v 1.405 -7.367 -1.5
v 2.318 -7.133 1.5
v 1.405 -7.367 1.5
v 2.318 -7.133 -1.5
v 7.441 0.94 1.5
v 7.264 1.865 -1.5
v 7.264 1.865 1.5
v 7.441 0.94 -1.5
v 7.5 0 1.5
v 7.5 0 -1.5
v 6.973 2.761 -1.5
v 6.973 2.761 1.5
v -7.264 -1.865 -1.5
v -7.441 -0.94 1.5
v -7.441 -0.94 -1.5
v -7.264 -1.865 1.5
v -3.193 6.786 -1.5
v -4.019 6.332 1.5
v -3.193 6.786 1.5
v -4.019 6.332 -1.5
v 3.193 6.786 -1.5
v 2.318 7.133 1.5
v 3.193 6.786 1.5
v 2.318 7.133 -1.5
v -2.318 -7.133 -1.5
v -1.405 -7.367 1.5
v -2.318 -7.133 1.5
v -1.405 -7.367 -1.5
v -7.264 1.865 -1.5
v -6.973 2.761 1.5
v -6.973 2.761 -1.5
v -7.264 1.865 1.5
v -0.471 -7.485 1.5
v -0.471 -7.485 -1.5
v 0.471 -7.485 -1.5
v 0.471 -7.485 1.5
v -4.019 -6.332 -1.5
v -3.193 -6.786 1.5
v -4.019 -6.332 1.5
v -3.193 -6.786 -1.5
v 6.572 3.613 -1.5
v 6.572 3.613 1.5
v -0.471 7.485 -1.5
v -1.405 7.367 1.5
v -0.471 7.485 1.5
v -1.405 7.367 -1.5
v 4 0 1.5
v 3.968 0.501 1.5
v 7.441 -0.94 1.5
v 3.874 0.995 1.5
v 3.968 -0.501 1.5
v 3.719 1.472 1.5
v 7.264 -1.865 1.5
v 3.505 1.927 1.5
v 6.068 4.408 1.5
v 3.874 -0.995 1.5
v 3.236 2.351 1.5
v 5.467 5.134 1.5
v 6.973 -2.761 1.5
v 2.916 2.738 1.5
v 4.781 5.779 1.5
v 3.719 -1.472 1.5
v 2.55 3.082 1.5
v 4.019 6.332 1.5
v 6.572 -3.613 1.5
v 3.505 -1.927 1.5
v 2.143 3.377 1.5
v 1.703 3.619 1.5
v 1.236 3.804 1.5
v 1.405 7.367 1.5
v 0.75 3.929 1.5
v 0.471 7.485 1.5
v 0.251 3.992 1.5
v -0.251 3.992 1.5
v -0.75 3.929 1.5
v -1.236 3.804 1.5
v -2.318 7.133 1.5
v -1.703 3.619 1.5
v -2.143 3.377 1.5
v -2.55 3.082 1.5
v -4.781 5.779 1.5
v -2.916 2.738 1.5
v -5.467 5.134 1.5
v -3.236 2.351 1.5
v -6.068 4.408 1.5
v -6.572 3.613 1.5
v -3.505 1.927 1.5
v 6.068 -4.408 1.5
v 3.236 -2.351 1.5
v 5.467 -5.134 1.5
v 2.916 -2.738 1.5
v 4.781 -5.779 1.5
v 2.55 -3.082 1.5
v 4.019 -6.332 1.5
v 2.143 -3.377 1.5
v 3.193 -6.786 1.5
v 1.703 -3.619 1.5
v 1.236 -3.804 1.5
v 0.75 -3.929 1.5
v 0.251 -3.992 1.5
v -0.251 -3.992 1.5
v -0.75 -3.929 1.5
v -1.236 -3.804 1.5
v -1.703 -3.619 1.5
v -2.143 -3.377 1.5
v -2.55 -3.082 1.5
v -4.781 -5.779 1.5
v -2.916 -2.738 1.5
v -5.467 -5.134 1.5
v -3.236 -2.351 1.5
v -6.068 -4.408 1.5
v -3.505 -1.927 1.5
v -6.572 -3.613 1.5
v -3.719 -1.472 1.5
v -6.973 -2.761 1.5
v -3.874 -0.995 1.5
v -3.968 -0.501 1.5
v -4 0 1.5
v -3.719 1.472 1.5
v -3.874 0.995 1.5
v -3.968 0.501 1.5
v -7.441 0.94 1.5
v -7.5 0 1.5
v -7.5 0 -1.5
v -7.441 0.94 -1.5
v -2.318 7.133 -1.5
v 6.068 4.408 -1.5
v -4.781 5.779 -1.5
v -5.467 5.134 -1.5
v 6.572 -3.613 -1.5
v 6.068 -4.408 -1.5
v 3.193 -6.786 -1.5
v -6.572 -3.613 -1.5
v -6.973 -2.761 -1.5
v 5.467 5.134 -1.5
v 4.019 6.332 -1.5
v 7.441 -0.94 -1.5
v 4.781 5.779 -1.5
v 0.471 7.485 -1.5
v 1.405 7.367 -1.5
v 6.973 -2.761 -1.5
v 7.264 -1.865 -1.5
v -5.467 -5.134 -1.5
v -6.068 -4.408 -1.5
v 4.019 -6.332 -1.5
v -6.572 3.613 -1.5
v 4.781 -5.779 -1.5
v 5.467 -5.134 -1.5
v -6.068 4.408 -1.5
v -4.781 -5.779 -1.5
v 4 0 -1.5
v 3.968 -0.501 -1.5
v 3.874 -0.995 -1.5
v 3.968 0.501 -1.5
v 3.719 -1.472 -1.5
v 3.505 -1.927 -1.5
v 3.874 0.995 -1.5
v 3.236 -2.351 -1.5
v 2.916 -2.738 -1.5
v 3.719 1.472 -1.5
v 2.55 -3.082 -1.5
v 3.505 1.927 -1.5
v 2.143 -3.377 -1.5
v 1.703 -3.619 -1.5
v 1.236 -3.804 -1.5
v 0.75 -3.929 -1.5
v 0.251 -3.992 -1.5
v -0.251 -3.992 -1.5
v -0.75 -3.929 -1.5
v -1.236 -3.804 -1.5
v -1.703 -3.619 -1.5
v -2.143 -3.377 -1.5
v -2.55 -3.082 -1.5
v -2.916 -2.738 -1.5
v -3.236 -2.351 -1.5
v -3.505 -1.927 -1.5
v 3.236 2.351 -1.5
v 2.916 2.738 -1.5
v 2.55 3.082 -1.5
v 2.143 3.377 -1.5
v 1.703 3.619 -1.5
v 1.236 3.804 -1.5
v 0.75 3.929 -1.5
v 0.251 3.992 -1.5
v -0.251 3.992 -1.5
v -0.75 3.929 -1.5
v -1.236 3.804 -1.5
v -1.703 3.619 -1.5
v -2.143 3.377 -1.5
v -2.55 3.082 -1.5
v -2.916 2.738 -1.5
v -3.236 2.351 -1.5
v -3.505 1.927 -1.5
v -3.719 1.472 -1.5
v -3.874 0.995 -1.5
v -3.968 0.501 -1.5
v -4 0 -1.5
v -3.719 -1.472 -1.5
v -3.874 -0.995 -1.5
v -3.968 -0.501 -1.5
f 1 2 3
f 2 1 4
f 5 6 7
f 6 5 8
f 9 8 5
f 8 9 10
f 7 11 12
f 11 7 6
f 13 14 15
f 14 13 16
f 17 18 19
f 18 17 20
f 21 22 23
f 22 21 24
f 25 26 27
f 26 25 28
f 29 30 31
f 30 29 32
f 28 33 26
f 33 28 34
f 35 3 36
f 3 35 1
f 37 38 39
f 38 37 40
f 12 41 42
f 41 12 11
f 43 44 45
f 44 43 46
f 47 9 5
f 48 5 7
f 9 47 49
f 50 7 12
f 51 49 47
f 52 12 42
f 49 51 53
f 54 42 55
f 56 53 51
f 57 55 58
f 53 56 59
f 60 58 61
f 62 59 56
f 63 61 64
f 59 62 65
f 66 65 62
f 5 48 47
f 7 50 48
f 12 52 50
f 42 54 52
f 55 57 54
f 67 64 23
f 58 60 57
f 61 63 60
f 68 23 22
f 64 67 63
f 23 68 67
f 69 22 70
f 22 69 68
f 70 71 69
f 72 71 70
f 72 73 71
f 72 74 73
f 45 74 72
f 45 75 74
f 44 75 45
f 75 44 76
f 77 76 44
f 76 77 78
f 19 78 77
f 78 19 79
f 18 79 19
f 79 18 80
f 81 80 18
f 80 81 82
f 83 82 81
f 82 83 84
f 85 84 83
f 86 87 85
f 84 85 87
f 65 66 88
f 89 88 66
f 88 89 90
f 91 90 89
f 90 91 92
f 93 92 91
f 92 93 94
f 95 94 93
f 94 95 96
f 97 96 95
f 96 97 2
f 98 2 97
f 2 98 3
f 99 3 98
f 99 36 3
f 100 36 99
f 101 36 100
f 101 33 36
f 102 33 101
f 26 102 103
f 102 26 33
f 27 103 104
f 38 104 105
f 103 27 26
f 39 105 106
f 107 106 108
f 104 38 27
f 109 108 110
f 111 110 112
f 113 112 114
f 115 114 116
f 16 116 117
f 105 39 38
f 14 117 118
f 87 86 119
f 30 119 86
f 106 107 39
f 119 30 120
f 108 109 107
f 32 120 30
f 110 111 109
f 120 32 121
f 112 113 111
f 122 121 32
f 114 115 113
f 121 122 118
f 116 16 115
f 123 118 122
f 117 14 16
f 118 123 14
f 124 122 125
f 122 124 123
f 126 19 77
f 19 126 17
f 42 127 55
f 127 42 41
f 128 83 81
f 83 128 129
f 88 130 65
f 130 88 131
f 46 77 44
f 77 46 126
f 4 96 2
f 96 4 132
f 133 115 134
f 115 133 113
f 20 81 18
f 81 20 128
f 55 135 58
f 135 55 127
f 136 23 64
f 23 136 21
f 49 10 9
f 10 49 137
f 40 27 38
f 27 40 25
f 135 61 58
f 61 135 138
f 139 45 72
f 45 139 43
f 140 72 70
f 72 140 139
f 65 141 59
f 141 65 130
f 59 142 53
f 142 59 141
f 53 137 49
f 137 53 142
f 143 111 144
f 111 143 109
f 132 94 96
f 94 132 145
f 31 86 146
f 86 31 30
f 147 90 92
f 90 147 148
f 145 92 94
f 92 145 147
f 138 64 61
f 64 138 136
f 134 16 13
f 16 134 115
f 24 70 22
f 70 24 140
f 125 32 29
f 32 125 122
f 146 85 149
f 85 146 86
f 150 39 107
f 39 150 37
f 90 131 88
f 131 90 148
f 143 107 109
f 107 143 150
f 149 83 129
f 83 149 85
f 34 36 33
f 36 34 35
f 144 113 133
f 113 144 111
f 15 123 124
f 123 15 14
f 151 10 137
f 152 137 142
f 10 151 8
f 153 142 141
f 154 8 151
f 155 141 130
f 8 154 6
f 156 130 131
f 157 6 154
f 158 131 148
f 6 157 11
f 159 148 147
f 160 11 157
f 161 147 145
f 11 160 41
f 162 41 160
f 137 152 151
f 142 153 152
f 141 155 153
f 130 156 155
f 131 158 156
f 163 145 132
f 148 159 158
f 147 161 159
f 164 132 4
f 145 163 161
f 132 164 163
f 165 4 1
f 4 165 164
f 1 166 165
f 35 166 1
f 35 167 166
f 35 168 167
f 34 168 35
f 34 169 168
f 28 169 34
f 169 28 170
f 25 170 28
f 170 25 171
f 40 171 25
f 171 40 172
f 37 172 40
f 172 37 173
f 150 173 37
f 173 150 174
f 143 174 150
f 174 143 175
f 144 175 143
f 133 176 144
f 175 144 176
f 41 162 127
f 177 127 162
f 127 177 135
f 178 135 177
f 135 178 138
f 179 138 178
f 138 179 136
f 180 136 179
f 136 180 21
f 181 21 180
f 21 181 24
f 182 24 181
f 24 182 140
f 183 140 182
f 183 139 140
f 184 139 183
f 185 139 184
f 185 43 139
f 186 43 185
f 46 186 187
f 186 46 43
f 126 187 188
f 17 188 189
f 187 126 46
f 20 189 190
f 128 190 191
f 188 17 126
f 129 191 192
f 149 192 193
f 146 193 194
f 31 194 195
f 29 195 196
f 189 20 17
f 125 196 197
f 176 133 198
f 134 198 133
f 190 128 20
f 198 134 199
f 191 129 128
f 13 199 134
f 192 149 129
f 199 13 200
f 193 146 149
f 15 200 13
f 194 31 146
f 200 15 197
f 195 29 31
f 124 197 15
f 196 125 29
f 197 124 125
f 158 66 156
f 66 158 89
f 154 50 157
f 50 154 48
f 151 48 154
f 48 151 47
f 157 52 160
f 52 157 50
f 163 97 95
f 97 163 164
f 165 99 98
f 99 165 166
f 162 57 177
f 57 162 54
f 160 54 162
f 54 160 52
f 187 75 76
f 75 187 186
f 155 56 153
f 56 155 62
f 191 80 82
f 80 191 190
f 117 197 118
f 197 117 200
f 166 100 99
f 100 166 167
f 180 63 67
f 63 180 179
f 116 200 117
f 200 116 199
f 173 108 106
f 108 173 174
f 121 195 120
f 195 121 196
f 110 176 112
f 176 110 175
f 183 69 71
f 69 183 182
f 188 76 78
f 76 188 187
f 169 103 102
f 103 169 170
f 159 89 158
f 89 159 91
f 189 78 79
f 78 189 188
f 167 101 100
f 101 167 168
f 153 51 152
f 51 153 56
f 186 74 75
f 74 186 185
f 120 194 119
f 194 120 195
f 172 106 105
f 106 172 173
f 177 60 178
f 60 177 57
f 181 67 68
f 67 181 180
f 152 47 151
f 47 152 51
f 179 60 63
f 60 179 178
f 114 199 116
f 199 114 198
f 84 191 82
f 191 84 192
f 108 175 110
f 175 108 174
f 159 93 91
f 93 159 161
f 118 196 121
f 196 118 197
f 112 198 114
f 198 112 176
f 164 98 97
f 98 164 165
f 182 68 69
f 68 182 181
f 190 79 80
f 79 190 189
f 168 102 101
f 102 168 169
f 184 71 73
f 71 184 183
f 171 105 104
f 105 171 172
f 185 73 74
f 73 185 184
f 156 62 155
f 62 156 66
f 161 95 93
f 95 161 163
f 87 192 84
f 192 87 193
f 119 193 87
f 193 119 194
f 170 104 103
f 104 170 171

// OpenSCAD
$fn = 50;


difference() {
	union() {
		translate(v = [0, 0, -1.5000000000]) {
			cylinder(h = 3, r = 7.5000000000);
		}
	}
	union() {
		translate(v = [0, 0, -100.0000000000]) {
			cylinder(h = 200, r = 4.0000000000);
		}
	}
}
